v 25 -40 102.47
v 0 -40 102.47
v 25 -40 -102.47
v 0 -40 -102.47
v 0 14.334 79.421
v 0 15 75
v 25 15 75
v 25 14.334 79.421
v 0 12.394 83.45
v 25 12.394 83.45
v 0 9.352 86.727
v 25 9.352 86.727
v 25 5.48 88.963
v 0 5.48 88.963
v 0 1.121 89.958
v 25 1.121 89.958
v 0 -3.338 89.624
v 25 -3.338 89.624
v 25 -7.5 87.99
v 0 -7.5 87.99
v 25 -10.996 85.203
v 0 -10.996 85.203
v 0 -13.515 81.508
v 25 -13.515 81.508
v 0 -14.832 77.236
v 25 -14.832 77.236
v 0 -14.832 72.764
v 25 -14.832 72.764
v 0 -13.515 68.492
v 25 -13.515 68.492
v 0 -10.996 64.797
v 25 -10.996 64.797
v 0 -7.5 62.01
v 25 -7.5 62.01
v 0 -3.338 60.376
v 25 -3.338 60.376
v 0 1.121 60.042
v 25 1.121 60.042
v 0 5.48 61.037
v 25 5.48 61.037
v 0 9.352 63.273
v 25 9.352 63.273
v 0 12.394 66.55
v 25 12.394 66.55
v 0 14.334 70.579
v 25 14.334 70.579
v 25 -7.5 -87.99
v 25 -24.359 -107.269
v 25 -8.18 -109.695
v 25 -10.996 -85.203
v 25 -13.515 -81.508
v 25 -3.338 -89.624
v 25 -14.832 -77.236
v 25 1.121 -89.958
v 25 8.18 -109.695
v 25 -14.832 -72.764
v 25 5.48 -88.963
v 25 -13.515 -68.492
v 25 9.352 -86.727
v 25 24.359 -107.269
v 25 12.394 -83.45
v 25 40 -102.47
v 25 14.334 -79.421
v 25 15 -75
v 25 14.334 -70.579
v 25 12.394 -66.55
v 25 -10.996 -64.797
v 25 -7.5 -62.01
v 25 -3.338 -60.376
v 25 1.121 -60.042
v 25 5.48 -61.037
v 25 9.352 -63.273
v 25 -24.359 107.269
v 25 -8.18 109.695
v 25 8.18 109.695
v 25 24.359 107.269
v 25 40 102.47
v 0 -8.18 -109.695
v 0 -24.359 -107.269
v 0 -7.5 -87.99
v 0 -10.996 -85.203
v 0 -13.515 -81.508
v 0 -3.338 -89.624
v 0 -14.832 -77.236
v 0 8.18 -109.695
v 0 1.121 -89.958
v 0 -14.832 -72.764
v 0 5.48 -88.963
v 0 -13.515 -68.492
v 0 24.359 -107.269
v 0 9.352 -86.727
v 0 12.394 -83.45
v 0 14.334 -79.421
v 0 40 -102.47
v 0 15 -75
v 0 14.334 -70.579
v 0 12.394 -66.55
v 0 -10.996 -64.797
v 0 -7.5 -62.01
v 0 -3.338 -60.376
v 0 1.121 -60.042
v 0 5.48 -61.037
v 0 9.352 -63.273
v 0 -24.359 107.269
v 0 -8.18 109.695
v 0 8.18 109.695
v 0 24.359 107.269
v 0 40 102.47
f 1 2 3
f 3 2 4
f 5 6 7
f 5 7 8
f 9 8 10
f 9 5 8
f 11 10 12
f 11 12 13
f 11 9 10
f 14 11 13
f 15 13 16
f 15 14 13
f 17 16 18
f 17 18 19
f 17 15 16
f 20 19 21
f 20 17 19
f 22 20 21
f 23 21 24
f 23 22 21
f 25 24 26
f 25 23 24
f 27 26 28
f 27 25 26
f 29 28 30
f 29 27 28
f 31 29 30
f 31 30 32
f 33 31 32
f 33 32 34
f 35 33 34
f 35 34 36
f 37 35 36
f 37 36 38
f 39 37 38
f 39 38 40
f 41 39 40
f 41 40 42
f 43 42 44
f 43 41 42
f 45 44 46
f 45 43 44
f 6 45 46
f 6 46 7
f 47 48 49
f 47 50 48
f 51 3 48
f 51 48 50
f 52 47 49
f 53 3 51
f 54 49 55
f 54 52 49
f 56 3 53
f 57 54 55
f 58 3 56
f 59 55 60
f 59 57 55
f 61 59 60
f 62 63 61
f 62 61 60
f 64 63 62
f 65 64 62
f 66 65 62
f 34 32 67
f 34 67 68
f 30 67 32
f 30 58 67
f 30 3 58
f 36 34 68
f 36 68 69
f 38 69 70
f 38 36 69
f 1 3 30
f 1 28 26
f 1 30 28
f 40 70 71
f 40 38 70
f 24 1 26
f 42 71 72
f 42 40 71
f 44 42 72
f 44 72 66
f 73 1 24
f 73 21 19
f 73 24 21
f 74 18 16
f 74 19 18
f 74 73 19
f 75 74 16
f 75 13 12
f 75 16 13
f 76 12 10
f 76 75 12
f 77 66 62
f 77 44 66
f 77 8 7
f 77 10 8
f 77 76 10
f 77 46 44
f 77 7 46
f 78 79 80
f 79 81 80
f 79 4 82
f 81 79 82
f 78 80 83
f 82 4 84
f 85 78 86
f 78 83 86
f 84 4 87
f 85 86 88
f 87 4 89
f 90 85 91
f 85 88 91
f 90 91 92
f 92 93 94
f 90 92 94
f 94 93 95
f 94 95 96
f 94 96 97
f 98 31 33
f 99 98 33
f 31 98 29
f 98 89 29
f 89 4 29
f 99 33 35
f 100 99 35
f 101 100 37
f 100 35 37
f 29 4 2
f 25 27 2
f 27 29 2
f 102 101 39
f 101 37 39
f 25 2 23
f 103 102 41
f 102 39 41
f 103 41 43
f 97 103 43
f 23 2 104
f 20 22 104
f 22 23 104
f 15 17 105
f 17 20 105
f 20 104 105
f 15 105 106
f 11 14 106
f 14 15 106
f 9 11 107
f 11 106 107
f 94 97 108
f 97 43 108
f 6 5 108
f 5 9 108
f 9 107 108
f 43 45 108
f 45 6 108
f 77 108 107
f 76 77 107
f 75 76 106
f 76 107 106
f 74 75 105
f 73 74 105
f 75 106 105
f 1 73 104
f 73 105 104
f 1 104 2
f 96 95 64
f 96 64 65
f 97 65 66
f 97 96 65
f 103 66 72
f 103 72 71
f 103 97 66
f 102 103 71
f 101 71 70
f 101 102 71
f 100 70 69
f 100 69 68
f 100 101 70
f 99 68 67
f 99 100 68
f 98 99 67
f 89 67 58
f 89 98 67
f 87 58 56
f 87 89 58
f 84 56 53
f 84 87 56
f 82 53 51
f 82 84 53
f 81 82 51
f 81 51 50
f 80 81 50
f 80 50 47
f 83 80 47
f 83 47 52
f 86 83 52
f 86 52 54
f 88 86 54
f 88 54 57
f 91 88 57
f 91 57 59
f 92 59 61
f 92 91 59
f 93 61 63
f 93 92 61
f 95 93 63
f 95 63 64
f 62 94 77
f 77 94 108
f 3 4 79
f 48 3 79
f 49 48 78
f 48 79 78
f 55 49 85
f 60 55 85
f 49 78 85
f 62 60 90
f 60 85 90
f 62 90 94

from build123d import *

# Parameters (mm, degrees)
F0_R     = 15
F1_DEPTH = 25


with BuildPart() as f1:
    # F0 (on Right) → F1 (new body)
    with BuildSketch(Plane.YZ):
        with BuildLine():
            Line((-40, 102.469508), (-40, -102.469508))
            ThreePointArc((-40, -102.469508), (0, -110), (40, -102.469508))
            Line((40, -102.469508), (40, 102.469508))
            ThreePointArc((40, 102.469508), (0, 110), (-40, 102.469508))
        make_face()
        with Locations((0, -75)):
            Circle(F0_R, mode=Mode.SUBTRACT)
        with Locations((0, 75)):
            Circle(F0_R, mode=Mode.SUBTRACT)
    extrude(amount=F1_DEPTH)


solid = f1.part
